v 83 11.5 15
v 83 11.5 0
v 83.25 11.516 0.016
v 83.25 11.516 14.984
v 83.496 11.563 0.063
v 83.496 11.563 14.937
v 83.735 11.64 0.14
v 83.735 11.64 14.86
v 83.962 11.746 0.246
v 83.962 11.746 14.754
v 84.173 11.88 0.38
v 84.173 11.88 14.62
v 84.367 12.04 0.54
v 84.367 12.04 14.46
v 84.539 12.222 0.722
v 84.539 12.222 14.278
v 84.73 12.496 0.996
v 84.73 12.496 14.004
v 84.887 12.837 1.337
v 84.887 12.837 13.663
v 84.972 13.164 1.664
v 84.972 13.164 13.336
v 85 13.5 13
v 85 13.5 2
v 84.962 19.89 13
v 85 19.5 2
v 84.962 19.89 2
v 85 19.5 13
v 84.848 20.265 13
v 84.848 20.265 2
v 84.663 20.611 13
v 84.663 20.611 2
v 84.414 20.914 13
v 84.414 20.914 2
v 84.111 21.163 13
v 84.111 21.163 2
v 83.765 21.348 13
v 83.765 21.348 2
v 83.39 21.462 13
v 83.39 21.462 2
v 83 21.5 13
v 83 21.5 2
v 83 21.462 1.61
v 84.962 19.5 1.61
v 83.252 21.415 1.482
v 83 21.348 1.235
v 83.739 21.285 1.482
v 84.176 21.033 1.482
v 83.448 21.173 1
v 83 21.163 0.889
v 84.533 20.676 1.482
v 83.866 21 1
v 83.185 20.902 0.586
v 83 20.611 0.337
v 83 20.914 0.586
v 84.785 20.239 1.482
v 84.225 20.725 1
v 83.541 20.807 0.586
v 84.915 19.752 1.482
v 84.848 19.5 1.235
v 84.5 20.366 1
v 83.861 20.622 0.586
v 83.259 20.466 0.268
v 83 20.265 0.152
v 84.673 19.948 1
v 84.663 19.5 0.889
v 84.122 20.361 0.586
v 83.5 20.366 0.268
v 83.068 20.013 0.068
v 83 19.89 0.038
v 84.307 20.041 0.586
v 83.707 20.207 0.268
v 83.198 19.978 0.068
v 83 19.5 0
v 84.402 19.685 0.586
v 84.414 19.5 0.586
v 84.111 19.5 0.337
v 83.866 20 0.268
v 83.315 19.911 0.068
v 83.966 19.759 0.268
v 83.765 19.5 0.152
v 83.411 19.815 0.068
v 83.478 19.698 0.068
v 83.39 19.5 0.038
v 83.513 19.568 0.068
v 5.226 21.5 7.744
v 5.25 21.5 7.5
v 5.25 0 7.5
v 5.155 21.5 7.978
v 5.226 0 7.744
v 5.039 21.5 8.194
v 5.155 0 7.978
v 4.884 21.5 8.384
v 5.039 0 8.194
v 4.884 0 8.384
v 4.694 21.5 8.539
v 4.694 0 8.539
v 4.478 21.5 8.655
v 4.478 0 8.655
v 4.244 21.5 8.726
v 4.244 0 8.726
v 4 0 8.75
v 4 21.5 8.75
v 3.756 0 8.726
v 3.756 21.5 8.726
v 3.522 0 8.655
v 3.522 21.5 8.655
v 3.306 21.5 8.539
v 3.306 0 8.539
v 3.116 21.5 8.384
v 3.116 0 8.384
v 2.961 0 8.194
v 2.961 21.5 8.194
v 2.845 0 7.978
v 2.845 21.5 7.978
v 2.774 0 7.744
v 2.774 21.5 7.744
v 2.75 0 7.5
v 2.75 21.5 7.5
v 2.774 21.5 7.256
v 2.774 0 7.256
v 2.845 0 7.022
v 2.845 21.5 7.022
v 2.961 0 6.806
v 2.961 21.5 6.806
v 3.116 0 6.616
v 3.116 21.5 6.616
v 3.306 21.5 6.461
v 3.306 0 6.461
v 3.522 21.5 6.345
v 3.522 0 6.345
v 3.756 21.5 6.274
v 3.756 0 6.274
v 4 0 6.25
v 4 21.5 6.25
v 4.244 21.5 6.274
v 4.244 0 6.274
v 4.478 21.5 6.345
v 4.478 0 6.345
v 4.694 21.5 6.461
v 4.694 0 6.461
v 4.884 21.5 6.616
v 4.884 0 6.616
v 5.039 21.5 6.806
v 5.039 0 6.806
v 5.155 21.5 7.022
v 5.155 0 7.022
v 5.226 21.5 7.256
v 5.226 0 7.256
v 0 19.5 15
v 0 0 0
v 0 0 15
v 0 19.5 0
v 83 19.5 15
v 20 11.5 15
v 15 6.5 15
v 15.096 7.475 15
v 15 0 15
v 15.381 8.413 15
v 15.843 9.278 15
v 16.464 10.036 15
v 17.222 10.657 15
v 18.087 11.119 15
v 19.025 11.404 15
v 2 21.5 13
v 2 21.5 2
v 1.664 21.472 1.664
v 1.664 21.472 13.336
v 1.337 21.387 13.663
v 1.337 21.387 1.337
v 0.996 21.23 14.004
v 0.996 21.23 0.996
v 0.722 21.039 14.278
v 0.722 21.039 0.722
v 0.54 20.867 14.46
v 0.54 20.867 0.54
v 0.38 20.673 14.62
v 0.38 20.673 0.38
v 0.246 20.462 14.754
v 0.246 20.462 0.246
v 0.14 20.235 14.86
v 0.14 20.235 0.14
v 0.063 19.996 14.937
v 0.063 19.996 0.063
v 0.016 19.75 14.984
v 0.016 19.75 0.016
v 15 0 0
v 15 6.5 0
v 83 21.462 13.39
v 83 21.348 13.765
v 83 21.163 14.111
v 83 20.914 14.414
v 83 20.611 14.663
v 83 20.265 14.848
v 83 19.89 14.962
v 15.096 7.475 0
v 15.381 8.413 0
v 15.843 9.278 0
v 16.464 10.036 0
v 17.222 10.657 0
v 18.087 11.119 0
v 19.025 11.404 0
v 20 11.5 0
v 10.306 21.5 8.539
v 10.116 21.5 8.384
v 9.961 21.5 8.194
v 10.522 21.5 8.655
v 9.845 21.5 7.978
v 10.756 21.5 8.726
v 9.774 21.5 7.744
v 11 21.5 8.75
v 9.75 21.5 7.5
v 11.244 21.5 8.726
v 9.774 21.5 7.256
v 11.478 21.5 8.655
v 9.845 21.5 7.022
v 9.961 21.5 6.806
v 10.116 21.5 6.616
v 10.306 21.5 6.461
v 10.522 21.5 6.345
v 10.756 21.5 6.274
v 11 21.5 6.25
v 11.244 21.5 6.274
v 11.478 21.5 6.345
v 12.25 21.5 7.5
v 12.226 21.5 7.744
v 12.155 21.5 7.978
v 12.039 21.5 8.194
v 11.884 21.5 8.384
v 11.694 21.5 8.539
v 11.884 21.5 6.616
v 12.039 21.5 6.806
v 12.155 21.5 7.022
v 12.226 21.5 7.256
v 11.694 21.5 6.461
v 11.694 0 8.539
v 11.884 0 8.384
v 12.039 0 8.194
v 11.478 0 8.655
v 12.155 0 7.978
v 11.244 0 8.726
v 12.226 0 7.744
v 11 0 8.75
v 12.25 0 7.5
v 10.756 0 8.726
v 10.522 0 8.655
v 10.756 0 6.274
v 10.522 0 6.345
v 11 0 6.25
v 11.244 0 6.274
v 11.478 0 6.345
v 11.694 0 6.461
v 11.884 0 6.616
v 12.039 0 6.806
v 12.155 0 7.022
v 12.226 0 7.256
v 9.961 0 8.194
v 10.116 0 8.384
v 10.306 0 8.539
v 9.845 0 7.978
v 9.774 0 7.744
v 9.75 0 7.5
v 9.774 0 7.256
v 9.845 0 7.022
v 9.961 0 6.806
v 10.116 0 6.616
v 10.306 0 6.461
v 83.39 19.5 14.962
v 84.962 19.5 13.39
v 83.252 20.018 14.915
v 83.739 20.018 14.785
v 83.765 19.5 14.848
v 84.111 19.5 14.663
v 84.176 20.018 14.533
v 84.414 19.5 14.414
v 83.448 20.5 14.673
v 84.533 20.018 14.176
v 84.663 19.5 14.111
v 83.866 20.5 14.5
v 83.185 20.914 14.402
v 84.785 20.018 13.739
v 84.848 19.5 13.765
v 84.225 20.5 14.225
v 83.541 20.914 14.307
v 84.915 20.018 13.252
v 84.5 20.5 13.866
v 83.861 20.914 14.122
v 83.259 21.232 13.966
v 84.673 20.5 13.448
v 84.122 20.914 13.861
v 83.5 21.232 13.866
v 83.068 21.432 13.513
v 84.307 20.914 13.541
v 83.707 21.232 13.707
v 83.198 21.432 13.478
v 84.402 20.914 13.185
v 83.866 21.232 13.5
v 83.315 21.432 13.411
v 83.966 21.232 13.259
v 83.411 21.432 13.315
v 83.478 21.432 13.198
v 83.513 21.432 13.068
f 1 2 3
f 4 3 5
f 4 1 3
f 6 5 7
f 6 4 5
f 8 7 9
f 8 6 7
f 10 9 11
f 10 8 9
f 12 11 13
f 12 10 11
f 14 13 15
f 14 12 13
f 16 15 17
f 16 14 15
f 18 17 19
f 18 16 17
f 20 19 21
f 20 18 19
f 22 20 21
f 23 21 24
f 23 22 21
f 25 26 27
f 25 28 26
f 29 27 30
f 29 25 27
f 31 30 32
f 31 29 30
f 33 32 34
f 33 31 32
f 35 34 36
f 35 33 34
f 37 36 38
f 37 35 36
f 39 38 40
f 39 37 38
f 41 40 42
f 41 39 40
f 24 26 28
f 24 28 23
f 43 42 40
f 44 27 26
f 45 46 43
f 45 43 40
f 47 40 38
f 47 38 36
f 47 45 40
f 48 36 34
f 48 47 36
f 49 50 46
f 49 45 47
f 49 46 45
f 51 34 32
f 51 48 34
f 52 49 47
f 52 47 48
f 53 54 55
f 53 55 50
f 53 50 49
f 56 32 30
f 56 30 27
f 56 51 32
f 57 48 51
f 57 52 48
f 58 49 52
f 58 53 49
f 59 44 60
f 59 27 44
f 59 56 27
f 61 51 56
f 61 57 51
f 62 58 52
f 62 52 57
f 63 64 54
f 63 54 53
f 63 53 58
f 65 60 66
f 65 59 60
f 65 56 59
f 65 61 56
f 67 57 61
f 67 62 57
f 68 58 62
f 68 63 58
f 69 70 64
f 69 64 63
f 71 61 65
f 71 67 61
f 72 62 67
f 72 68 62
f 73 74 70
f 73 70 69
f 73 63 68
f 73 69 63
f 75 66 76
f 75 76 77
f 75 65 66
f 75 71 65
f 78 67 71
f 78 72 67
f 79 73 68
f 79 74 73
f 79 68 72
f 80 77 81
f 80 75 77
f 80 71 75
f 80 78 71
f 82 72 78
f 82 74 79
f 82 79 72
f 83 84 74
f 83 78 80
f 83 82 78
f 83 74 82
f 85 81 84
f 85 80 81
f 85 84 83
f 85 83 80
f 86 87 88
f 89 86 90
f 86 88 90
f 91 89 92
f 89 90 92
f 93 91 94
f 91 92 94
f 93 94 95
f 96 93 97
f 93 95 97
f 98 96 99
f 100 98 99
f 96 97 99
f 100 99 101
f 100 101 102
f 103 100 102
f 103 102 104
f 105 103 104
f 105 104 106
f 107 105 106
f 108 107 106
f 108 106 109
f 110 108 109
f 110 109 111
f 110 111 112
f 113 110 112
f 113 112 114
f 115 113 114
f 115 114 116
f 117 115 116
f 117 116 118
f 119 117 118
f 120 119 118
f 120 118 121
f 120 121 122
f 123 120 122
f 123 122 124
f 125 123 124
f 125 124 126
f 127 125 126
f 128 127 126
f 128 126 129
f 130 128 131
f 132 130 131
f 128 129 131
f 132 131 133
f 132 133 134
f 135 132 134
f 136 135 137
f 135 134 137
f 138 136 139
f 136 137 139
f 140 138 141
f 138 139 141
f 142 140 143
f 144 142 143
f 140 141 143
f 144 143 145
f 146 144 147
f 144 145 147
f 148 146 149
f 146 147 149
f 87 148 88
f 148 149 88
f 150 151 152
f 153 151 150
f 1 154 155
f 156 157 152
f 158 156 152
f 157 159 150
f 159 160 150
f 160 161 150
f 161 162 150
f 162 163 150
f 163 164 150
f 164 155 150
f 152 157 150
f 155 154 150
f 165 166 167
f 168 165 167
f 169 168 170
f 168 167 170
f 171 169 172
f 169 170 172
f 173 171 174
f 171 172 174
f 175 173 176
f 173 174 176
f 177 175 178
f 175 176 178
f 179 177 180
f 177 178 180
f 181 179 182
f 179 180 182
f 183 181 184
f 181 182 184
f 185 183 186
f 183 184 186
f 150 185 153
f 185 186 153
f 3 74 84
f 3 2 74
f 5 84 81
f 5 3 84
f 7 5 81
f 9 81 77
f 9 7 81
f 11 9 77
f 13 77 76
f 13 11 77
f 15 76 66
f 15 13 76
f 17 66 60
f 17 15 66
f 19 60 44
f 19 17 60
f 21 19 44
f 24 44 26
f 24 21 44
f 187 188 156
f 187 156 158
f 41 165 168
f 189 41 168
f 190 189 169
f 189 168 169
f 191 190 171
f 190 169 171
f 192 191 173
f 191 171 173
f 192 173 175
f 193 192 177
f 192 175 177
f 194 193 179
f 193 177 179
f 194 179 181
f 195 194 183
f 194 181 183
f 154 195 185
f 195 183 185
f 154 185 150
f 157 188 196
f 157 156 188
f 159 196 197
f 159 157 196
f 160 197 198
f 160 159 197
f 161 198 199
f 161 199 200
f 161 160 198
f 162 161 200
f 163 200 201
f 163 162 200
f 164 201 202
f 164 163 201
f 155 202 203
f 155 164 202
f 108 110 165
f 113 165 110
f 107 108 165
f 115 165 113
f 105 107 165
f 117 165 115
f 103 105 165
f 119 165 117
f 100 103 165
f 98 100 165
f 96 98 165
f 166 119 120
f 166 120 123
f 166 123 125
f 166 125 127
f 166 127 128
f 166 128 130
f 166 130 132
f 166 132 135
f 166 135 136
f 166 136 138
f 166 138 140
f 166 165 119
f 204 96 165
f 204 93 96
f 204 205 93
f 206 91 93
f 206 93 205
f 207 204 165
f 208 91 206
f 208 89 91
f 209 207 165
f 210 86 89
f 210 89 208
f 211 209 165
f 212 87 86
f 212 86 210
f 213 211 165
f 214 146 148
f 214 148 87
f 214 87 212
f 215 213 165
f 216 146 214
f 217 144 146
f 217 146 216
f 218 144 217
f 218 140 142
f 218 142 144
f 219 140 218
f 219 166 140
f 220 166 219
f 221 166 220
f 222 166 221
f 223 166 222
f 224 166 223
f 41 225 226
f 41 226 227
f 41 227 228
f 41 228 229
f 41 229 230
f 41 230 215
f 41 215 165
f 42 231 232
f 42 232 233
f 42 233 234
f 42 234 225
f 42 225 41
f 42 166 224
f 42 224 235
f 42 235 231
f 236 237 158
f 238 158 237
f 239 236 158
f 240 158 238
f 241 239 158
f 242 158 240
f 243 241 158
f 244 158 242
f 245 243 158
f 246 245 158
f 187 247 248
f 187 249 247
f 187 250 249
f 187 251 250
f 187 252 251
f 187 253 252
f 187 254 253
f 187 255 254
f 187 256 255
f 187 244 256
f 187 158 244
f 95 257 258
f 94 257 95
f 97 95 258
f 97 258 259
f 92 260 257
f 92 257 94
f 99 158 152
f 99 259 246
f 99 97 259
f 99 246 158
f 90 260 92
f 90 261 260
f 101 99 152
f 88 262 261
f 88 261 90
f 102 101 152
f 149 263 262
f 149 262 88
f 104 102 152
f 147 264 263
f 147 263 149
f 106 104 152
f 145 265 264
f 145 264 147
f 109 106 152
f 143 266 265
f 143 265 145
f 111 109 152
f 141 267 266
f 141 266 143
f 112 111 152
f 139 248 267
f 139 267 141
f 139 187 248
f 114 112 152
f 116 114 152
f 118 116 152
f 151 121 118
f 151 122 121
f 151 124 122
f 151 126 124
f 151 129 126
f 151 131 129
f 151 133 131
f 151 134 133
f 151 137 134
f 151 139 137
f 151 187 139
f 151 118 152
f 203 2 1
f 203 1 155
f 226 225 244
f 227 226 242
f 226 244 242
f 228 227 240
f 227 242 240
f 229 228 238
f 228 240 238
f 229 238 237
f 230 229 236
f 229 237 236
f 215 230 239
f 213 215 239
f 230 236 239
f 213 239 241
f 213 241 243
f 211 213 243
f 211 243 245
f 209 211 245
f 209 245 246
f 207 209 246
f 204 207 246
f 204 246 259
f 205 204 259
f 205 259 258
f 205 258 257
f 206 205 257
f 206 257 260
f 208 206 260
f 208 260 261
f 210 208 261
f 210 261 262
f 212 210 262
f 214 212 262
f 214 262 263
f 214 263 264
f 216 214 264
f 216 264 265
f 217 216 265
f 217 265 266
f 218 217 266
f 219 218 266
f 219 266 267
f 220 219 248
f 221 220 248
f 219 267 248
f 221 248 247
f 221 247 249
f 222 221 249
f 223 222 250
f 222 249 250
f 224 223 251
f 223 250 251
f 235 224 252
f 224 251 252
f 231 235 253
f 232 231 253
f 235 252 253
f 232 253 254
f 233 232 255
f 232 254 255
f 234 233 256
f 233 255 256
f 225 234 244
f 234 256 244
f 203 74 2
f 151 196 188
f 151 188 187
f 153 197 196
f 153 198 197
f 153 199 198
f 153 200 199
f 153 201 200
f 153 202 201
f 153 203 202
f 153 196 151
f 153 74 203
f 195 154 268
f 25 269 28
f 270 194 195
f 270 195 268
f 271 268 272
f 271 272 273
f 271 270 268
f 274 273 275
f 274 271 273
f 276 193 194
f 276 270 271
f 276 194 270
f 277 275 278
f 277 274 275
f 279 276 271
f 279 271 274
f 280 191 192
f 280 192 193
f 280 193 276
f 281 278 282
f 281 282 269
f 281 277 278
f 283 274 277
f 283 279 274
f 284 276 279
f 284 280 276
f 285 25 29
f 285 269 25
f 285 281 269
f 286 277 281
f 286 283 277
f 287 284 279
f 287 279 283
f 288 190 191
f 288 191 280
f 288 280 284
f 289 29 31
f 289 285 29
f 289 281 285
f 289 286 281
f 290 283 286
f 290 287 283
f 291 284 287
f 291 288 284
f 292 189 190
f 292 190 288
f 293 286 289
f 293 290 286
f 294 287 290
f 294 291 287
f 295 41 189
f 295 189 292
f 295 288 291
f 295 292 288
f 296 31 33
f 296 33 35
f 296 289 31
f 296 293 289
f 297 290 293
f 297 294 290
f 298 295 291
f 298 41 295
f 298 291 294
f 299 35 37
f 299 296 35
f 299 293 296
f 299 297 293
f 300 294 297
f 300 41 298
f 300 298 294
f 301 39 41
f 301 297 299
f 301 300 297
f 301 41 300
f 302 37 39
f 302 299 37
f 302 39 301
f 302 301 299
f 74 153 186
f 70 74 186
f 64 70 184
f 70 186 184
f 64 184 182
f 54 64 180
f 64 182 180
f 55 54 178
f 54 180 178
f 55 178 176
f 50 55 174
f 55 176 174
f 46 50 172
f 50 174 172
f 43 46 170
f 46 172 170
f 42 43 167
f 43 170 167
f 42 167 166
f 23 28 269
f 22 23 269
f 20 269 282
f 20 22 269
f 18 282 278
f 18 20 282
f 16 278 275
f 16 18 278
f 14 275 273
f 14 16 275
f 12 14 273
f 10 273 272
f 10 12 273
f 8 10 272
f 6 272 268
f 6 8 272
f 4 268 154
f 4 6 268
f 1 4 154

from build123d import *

# Parameters (mm, degrees)
BOSS_EXTRUDE1_DEPTH = 15
SKETCH2_R           = 1.25
CUT_EXTRUDE1_DEPTH  = 89.950829114
FILLET1_R           = 5
FILLET2_R           = 2
FILLET3_R           = 2


with BuildPart() as part:
    # Sketch1 → Boss-Extrude1 (new body)
    with BuildSketch(Plane.XY):
        Polygon((0, 0), (0, 21.5), (85, 21.5), (85, 11.5), (15, 11.5), (15, 0), align=None)
    extrude(amount=BOSS_EXTRUDE1_DEPTH)

    # Sketch2 → Cut-Extrude1 (cut, through all)
    with BuildSketch(Plane.XZ):
        with Locations((4, 7.5)):
            Circle(SKETCH2_R)
        with Locations((11, 7.5)):
            Circle(SKETCH2_R)
    extrude(amount=-CUT_EXTRUDE1_DEPTH, mode=Mode.SUBTRACT)

    # Fillet1
    fillet1_edges = [part.edges().sort_by_distance(p)[0] for p in [
        (15, 11.5, 7.5),
    ]]
    fillet(fillet1_edges, radius=FILLET1_R)

    # Fillet2
    fillet2_edges = [part.edges().sort_by_distance(p)[0] for p in [
        (85, 21.5, 7.5),
        (85, 11.5, 7.5),
        (85, 16.5, 15),
        (85, 16.5, 0),
    ]]
    fillet(fillet2_edges, radius=FILLET2_R)

    # Fillet3
    # the kernel refuses this fillet: 2 mm, written as the material it takes off along each edge
    with BuildSketch(Plane(origin=(83, 19.5, 13), x_dir=(0, 0, 1), z_dir=(0, 1, 0))) as fillet3_piece_1_section:
        Polygon((0, 0), (FILLET3_R, 0), (FILLET3_R, FILLET3_R), (0, FILLET3_R), align=None)
    fillet3_piece_1 = extrude(amount=FILLET3_R, mode=Mode.PRIVATE)
    fillet3_piece_1 = fillet3_piece_1 - Plane(origin=(83, 19.5, 13), x_dir=(-0.7071067811865475, 2.0097183471152325e-15, -0.7071067811865475), z_dir=(0, 1, 0)) * Sphere(FILLET3_R, mode=Mode.PRIVATE)
    add(fillet3_piece_1, mode=Mode.SUBTRACT)
    with BuildSketch(Plane(origin=(83, 19.5, 2), x_dir=(0, 1, 0), z_dir=(0, 0, -1))) as fillet3_piece_2_section:
        Polygon((0, 0), (FILLET3_R, 0), (FILLET3_R, FILLET3_R), (0, FILLET3_R), align=None)
    fillet3_piece_2 = extrude(amount=FILLET3_R, mode=Mode.PRIVATE)
    fillet3_piece_2 = fillet3_piece_2 - Plane(origin=(83, 19.5, 2), x_dir=(-0.7071067811865486, -0.7071067811865466, 0), z_dir=(0, 0, -1)) * Sphere(FILLET3_R, mode=Mode.PRIVATE)
    add(fillet3_piece_2, mode=Mode.SUBTRACT)
    with BuildSketch(Plane(origin=(0, 21.5, -5), x_dir=(1, 0, 0), z_dir=(0, 0, 1))) as fillet3_piece_3:
        with BuildLine():
            CenterArc((FILLET3_R, -FILLET3_R), FILLET3_R, 90, 90)
            Line((0, -FILLET3_R), (0, 0))
            Line((0, 0), (FILLET3_R, 0))
        make_face()
    extrude(amount=25, mode=Mode.SUBTRACT)
    with BuildSketch(Plane(origin=(-5, 21.5, 0), x_dir=(0, -1, 0), z_dir=(1, 0, 0)), Plane(origin=(-5, 21.5, 15), x_dir=(0, 0, -1), z_dir=(1, 0, 0))) as fillet3_piece_4:
        with BuildLine():
            CenterArc((FILLET3_R, -FILLET3_R), FILLET3_R, 90, 90)
            Line((0, -FILLET3_R), (0, 0))
            Line((0, 0), (FILLET3_R, 0))
        make_face()
    extrude(amount=88, mode=Mode.SUBTRACT)


solid = part.part
